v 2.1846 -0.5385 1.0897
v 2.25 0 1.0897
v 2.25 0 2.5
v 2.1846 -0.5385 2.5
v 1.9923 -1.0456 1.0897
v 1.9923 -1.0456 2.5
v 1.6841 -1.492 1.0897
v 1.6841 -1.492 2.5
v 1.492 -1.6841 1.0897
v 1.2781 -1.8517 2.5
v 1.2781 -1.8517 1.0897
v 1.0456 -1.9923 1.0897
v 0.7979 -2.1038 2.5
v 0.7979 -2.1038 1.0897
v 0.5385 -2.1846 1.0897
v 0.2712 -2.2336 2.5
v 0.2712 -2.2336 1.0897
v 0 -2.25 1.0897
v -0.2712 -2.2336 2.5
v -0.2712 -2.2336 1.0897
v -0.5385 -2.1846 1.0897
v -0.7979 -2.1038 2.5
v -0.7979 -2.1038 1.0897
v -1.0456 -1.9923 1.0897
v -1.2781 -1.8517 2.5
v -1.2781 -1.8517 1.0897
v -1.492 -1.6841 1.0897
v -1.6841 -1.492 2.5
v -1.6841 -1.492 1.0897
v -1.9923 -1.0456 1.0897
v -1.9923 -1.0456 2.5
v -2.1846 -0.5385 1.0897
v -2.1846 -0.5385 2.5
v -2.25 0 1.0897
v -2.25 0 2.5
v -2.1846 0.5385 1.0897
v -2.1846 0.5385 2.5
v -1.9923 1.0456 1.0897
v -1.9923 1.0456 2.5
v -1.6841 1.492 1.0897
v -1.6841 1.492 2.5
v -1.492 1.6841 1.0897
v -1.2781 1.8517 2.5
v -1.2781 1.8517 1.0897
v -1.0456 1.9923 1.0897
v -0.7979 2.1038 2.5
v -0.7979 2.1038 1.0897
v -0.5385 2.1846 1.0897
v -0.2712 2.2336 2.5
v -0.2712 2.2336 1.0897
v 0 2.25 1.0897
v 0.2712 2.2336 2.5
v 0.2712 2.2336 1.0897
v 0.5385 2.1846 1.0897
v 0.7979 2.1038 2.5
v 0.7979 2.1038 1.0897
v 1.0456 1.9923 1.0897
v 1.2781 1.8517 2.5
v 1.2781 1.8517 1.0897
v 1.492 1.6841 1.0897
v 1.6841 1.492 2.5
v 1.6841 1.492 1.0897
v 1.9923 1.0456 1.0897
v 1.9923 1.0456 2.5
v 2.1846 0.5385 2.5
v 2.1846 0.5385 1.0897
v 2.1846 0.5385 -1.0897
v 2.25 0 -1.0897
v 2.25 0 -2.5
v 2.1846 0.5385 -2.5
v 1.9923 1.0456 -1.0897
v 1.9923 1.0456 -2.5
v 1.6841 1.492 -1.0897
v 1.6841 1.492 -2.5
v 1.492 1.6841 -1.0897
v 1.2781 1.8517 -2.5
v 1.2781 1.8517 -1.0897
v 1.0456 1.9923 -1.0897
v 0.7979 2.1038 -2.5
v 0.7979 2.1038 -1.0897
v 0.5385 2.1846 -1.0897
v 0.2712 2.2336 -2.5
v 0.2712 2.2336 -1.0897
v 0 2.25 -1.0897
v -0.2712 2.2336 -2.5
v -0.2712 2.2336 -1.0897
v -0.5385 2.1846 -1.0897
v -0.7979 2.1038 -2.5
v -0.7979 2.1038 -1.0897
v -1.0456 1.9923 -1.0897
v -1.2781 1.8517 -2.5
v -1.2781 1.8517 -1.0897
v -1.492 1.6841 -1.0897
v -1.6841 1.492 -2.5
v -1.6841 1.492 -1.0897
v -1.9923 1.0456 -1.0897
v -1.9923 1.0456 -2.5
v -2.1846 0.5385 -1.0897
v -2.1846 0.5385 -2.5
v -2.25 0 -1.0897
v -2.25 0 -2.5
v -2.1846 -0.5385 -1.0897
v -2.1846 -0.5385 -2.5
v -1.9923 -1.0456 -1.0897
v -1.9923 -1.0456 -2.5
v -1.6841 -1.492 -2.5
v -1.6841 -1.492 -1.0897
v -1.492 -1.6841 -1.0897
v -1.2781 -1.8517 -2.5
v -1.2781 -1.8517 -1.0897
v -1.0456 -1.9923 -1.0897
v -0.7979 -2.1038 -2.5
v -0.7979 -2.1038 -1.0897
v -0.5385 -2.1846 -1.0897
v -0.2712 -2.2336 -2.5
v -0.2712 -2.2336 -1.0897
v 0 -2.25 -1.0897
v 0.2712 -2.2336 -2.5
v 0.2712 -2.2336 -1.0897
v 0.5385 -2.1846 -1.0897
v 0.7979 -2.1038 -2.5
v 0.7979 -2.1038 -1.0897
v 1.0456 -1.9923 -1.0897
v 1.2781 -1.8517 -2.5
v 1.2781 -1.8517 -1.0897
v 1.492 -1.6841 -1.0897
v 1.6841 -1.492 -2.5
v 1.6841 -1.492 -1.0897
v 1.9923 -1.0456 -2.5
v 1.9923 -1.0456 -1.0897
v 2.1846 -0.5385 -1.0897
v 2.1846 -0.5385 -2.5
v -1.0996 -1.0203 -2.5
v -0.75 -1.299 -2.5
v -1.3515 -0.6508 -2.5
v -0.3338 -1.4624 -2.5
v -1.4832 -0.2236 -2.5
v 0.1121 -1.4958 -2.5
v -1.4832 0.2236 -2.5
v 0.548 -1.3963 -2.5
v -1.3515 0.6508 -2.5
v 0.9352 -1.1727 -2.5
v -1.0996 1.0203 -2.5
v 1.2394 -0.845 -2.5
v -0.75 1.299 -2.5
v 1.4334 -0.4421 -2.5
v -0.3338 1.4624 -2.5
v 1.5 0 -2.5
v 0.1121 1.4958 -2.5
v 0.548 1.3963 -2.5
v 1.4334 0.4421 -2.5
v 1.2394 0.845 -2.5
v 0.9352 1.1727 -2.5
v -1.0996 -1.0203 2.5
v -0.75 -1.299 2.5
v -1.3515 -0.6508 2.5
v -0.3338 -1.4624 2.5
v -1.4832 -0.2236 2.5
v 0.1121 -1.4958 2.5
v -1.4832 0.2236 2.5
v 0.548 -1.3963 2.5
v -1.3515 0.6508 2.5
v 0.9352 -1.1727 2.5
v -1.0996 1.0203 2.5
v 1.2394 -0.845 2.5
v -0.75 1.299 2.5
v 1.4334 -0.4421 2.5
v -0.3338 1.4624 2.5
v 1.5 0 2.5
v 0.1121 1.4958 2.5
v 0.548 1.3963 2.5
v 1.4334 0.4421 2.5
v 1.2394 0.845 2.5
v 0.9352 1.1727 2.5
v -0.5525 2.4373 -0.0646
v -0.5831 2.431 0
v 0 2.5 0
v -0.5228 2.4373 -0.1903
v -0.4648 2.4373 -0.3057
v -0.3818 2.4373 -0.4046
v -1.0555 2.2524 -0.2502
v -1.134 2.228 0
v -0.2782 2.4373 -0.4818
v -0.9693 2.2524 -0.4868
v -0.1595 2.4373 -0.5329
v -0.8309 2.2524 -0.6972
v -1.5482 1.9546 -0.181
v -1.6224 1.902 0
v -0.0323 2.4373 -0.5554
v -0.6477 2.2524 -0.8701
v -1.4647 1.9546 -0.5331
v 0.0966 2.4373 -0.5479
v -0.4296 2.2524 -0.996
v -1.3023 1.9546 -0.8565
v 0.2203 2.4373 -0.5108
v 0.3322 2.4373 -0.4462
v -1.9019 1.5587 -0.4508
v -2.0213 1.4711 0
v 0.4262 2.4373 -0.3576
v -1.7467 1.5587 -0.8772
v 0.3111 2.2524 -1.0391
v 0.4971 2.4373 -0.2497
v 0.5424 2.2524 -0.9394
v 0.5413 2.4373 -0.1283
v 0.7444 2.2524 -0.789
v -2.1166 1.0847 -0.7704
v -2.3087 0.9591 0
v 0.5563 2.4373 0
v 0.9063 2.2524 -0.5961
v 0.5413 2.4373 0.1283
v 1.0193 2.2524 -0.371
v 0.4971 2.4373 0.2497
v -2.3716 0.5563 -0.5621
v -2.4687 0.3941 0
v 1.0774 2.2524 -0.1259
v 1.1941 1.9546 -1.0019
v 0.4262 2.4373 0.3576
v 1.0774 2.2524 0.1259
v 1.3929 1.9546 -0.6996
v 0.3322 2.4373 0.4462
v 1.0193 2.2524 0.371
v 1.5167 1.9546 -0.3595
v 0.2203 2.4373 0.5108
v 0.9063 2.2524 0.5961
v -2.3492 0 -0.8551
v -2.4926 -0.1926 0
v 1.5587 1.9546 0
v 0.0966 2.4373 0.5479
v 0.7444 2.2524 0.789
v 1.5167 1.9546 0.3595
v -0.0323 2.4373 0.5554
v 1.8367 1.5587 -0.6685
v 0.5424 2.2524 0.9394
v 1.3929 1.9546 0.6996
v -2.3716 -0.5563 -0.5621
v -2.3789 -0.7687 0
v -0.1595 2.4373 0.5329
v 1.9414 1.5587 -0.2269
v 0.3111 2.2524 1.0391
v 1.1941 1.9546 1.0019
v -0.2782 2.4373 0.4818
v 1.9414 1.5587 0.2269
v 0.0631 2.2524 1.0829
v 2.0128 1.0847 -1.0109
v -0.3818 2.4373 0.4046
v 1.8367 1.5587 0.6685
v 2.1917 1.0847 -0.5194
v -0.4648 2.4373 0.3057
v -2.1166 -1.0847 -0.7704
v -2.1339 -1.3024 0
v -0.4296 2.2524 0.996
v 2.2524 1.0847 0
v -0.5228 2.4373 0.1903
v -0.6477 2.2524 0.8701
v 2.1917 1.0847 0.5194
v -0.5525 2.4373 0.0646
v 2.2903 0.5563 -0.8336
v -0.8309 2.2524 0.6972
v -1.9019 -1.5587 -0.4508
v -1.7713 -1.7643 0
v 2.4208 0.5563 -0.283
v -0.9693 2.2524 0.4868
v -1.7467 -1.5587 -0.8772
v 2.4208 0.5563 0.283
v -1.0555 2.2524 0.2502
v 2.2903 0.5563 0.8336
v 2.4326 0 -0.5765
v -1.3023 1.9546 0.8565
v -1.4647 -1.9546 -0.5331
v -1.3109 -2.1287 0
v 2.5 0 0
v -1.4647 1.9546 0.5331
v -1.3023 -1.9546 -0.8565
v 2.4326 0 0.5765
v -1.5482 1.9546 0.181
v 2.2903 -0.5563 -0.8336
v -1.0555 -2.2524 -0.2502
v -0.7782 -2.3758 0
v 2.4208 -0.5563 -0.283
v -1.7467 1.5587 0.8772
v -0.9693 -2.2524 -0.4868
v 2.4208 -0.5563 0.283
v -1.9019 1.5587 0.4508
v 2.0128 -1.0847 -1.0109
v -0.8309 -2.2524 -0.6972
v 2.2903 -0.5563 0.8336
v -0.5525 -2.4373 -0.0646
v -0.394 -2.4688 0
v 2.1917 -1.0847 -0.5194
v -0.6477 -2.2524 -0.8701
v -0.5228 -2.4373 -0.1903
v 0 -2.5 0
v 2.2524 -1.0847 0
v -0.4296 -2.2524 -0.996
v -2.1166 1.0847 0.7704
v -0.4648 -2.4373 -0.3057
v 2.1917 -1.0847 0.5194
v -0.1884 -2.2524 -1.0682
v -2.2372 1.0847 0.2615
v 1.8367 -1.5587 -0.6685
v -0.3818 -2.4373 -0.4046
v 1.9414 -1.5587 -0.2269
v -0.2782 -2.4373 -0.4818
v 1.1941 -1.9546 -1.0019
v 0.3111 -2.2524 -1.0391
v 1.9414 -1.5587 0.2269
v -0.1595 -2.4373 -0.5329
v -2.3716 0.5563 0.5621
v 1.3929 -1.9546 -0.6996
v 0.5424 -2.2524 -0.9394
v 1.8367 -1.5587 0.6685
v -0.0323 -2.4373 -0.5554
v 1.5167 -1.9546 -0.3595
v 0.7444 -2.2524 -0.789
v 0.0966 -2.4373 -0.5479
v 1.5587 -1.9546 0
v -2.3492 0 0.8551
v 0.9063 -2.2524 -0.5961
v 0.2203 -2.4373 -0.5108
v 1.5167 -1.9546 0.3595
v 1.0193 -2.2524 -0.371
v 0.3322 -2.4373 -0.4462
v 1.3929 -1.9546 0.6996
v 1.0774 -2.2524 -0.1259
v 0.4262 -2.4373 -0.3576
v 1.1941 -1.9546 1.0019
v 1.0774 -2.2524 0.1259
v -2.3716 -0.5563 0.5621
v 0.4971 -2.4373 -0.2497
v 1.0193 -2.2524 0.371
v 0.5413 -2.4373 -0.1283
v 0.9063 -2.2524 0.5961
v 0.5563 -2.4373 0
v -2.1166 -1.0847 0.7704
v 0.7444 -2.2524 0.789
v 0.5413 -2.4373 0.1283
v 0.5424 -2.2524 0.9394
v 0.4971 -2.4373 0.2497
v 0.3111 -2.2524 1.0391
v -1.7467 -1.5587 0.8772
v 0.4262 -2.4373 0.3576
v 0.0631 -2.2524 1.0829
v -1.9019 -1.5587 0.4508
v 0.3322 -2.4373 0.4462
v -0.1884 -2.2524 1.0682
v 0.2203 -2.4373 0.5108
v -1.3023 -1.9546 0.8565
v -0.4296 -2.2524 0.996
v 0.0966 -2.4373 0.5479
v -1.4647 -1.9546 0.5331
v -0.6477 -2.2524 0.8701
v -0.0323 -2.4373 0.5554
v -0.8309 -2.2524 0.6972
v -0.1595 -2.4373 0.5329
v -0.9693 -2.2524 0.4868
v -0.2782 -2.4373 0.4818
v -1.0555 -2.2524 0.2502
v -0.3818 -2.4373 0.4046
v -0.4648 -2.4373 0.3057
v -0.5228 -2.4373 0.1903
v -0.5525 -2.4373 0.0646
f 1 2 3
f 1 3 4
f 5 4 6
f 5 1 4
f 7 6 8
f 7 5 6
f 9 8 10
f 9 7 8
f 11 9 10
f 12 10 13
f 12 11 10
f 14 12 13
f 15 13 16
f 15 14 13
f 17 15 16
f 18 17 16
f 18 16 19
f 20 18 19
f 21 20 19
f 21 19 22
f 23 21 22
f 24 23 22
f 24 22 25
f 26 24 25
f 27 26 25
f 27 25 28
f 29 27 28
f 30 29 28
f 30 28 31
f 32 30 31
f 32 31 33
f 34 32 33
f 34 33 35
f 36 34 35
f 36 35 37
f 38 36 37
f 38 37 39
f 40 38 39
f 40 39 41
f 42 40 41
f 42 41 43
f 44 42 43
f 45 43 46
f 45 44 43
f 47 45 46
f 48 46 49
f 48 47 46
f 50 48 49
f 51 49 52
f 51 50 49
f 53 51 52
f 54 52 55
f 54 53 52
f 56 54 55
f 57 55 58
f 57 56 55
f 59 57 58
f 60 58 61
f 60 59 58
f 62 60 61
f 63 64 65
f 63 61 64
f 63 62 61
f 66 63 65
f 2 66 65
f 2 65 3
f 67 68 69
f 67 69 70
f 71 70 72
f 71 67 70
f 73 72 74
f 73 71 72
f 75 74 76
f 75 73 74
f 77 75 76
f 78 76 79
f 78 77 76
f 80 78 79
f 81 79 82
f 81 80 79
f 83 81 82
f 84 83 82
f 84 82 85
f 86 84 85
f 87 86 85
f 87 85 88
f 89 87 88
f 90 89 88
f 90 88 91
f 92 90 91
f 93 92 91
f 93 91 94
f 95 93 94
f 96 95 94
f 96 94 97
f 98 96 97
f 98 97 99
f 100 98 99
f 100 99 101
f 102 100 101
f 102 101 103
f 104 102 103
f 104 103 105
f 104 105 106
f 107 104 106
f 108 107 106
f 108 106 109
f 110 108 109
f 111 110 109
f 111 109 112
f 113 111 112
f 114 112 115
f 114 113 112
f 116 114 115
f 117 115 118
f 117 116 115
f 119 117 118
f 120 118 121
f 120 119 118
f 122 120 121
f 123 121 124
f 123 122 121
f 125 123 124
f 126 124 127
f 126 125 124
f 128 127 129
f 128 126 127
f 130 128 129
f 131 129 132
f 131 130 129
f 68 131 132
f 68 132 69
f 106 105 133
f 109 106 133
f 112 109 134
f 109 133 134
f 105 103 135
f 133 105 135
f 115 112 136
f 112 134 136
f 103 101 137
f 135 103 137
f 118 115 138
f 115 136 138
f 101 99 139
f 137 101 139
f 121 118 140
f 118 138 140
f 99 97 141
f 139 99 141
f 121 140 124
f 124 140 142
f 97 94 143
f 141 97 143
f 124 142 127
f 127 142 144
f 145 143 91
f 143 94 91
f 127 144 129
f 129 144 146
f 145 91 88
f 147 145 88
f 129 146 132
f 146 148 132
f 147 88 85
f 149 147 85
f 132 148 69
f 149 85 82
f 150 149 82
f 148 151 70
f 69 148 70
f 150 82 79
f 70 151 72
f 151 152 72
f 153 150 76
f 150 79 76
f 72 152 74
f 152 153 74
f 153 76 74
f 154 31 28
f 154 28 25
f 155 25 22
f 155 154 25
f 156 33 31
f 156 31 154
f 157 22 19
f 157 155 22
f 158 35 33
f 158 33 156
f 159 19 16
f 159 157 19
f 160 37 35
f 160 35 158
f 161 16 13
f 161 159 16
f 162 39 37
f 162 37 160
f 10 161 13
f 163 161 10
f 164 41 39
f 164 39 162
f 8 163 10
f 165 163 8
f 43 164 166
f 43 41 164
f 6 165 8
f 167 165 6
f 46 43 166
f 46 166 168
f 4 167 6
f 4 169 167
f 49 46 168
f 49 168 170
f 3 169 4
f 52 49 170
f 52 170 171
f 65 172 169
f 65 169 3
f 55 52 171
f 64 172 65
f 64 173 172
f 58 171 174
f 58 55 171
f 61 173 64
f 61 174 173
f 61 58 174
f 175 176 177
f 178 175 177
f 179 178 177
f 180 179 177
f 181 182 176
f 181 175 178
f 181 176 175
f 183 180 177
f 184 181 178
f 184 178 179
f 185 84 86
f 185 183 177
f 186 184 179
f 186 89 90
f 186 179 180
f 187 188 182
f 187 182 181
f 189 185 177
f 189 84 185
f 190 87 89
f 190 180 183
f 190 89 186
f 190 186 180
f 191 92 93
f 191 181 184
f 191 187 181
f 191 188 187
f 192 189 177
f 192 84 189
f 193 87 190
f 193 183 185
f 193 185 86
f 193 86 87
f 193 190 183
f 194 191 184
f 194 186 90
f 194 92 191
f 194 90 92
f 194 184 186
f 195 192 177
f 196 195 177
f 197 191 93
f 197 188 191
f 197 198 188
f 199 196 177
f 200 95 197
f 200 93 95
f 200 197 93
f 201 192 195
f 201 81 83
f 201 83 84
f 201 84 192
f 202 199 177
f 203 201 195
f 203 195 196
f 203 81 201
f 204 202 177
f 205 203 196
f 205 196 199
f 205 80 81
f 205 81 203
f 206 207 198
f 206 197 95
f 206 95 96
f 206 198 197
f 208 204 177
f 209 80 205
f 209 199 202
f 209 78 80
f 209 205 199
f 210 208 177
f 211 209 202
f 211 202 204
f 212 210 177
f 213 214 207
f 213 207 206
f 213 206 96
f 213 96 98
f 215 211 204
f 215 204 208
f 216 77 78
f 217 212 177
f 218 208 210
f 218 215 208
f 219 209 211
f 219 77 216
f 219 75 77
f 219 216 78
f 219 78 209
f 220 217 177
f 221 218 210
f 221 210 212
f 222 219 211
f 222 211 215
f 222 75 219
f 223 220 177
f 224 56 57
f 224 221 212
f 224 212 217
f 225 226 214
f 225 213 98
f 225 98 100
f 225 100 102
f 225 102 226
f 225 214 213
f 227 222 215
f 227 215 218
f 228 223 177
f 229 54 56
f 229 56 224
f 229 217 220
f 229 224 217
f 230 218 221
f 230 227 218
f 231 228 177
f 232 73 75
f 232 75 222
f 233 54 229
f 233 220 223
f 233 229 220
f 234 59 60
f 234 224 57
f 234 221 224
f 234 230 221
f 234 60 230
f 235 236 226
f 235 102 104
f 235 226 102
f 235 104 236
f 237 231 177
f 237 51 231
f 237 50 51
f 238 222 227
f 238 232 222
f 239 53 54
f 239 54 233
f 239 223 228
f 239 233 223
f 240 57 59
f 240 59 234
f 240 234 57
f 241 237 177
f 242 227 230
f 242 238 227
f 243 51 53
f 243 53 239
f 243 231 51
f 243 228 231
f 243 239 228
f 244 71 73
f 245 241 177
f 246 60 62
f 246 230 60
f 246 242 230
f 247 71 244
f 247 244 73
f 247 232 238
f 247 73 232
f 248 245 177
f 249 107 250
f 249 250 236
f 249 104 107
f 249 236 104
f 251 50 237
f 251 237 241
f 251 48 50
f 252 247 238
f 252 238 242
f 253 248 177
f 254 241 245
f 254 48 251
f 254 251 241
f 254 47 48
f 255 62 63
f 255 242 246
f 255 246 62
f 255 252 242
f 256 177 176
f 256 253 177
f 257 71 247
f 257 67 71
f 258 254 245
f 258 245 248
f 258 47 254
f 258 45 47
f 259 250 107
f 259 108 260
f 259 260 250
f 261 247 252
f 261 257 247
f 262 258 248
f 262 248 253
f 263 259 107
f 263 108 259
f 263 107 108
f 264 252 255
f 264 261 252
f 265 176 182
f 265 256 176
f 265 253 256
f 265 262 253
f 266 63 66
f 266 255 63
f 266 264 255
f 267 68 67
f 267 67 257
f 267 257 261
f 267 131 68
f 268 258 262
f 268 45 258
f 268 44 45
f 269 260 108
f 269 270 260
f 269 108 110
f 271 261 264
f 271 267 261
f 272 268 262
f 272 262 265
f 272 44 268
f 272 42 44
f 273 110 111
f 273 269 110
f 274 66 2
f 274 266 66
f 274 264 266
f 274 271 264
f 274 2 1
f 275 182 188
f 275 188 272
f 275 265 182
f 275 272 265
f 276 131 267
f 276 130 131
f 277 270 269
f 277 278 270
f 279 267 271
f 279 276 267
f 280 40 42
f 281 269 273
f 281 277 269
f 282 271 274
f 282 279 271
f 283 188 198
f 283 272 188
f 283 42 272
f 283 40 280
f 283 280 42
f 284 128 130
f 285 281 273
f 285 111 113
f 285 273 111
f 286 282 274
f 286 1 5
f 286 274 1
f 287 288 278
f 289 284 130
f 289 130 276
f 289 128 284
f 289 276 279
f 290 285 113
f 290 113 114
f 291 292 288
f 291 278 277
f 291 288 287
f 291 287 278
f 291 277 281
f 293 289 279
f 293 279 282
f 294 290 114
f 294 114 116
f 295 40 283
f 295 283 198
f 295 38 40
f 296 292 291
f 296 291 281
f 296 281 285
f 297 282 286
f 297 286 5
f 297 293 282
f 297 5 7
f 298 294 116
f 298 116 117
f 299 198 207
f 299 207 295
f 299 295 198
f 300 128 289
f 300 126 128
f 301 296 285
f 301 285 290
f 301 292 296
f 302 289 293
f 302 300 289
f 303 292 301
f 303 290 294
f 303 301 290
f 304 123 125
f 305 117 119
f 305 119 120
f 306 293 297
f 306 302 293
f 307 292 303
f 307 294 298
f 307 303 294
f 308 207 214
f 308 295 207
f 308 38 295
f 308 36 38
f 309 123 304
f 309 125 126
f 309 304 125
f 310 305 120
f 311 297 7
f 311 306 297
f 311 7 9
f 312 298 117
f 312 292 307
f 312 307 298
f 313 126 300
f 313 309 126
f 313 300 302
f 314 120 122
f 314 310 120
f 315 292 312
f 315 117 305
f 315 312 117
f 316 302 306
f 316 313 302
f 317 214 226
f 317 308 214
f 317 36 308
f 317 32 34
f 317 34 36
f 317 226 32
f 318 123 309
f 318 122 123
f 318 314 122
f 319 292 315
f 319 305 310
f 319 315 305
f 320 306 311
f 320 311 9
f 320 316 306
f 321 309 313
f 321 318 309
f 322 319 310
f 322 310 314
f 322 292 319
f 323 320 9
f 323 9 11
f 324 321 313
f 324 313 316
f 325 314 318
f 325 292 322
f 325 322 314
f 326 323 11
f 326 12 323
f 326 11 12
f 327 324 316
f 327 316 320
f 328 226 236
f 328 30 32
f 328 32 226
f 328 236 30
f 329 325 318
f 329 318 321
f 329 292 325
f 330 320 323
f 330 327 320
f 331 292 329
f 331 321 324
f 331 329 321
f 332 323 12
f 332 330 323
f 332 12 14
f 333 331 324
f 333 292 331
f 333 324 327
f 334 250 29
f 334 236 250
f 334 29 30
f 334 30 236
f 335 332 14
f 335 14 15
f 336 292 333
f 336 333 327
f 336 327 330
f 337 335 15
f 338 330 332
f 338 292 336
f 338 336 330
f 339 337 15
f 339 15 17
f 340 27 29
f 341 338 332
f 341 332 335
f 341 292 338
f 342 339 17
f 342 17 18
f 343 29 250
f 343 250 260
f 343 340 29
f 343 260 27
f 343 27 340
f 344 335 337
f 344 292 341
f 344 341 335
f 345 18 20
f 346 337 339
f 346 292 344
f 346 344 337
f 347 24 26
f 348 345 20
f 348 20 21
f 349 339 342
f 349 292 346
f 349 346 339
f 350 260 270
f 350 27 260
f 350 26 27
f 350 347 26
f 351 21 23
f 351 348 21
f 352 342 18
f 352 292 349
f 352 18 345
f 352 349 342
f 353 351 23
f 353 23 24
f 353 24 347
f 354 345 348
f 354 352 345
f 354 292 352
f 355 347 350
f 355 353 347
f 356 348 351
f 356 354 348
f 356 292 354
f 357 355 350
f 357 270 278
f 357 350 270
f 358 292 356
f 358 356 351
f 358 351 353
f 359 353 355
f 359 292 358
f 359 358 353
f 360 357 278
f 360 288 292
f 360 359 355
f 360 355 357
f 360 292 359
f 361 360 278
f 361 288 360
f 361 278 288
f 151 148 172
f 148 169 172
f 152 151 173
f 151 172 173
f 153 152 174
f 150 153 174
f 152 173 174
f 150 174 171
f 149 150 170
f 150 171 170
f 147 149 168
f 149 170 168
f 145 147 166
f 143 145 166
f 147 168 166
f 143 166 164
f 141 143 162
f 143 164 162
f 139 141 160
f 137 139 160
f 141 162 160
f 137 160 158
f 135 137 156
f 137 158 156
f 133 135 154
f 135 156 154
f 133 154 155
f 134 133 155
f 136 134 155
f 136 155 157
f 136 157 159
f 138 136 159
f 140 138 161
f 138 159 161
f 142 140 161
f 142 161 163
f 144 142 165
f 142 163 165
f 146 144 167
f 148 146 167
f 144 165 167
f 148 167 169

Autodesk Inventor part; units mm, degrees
ref_plane "YZ Plane" through (0, 0, 0) normal (1, 0, 0) x (0, 1, 0)
ref_plane "XZ Plane" through (0, 0, 0) normal (0, 1, 0) x (-1, 0, 0)
ref_plane "XY Plane" through (0, 0, 0) normal (0, 0, 1) x (1, 0, 0)
sketch "スケッチ1" plane through (0, 0, 0) normal (0, 0, 1) x (1, 0, 0)
  line L0 (0, 0) -> (0, 2.5)
  line L1 (0, 0) -> (0, -2.5)
  arc A0 (0, 2.5) -> (0, -2.5) centre (0, 0) ccw
  dimension "d0" = 2.5
  dimension "d1" = 2.5
  dimension "d2" = 2.5
revolve "回転1" add sketch "スケッチ1" angle 360 about axis through (0, 0, 0) along (0, 1, 0)
sketch "スケッチ2" plane through (0, 0, 0) normal (0, 0, 1) x (1, 0, 0)
  circle A0 centre (0, 0) radius 1.5
  circle A1 centre (0, 0) radius 2.25
  dimension "d4" = 3
  dimension "d5" = 4.5
extrude "押し出し1" add sketch "スケッチ2" along normal mid plane 5
sketch "スケッチ3" plane through (0, 0, 0) normal (0, 0, 1) x (1, 0, 0)
  circle A0 centre (0, 0) radius 1.5
extrude "押し出し2" cut sketch "スケッチ3" along normal mid plane 5
properties part number "タミヤダンパー部品8.1" material "アセタール樹脂、黒"
